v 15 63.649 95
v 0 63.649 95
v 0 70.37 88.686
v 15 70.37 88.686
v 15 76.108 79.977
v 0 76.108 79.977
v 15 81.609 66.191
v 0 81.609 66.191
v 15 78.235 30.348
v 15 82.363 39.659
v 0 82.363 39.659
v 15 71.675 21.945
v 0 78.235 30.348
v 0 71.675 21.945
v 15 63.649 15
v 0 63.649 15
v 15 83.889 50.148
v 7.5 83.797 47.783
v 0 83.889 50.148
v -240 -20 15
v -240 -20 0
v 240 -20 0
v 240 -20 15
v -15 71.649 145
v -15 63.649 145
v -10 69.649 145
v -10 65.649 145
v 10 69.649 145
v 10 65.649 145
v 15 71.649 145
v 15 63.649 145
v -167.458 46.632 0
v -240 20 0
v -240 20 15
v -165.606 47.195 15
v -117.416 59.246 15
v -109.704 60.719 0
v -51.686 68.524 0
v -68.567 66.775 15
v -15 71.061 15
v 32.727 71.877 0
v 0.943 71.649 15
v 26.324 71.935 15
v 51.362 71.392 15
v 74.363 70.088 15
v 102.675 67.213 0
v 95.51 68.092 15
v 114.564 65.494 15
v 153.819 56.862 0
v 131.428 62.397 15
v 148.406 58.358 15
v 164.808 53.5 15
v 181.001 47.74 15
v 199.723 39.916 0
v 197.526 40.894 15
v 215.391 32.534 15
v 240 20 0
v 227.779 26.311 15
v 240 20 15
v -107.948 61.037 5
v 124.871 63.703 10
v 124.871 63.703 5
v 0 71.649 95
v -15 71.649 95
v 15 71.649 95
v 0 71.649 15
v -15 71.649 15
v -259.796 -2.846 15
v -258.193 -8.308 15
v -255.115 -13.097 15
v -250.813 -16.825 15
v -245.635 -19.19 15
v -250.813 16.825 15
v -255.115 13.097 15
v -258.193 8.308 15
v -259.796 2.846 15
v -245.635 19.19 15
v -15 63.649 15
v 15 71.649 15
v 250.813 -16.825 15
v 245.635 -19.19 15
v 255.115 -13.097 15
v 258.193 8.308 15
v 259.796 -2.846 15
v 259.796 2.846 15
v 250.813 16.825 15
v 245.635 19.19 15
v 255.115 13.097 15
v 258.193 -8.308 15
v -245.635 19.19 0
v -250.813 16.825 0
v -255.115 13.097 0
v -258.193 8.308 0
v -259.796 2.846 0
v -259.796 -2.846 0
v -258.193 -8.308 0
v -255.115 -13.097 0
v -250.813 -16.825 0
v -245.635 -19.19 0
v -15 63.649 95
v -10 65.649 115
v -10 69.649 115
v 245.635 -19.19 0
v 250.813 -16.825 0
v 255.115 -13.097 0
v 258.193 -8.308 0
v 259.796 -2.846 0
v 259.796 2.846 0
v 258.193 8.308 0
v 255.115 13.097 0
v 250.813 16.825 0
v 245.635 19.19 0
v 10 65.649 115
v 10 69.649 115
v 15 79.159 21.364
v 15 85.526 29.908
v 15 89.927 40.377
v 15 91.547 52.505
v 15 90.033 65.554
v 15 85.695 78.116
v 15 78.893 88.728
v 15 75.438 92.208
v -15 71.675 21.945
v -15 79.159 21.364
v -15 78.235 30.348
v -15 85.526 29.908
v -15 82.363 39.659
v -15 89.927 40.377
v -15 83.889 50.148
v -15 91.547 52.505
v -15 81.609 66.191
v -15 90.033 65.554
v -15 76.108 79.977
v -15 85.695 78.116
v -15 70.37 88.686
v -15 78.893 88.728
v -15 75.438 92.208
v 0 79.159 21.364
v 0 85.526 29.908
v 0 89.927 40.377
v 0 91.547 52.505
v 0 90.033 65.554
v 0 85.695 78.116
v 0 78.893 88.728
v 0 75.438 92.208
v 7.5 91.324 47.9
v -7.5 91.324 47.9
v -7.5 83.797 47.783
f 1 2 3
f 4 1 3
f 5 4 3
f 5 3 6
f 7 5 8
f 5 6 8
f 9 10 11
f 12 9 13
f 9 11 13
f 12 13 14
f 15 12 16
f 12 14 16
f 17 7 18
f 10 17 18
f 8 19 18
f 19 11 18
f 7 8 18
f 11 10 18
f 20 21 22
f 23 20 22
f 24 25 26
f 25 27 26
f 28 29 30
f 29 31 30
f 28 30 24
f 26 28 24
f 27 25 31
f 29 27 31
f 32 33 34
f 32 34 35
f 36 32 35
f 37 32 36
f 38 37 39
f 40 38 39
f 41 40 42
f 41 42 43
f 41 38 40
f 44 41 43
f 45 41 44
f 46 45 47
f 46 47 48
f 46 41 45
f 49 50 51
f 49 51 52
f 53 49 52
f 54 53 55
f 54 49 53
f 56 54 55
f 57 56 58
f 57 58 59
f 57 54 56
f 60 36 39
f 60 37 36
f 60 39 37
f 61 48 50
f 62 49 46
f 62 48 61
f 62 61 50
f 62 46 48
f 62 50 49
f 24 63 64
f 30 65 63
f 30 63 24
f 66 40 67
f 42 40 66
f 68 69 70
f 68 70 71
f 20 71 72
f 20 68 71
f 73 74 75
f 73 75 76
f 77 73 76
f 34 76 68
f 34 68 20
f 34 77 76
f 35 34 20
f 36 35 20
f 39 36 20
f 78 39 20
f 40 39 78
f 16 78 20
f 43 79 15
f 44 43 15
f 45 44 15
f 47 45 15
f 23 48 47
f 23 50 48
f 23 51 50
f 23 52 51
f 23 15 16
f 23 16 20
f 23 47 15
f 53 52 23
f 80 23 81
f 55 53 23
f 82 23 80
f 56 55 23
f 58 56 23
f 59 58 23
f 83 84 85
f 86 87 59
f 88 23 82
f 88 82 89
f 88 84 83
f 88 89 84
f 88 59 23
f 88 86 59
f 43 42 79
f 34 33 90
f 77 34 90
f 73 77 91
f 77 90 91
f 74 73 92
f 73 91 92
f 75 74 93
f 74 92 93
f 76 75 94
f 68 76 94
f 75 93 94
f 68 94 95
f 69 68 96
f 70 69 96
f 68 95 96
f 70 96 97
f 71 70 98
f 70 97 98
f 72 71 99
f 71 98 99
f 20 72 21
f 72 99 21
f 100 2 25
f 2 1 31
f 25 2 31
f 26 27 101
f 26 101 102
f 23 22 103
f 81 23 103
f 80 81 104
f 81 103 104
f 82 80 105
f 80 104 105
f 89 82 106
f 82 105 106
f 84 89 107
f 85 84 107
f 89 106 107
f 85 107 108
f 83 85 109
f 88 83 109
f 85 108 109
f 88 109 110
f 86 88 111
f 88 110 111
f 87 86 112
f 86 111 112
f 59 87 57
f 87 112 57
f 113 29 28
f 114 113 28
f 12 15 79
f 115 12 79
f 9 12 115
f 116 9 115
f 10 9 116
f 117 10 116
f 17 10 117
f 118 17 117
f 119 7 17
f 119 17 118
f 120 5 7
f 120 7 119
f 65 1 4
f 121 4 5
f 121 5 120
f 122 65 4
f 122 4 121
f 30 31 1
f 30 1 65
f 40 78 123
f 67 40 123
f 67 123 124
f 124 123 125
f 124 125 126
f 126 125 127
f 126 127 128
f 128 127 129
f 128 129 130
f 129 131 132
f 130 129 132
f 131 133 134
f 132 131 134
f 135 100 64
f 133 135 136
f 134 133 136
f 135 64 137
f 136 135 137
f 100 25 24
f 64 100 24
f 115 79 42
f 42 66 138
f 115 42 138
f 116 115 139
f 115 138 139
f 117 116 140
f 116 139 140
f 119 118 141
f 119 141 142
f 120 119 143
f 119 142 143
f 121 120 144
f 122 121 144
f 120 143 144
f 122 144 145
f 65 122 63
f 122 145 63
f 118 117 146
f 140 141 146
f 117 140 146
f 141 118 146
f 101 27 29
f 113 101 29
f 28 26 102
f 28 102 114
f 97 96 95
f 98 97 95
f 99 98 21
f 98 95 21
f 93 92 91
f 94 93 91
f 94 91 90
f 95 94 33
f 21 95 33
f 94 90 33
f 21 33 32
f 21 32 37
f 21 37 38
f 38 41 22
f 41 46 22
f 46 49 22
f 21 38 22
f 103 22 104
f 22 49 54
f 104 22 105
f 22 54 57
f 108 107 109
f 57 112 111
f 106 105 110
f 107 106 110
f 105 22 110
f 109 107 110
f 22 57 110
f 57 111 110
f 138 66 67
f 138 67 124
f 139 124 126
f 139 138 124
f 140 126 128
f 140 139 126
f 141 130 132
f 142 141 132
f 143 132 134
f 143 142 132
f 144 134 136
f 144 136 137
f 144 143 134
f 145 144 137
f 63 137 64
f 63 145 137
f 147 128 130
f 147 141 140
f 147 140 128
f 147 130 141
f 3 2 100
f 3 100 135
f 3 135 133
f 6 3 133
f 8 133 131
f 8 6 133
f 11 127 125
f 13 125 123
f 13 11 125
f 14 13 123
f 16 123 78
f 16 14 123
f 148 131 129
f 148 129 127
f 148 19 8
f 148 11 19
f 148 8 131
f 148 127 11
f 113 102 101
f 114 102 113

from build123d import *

# Parameters (mm, degrees)
F1_DEPTH = 15
F2_W     = 8
F2_H     = 50
F3_DEPTH = 15
F4_W     = 20
F4_H     = 4
F5_DEPTH = 30


with BuildPart() as f1:
    # F0 (on Top) → F1 (new body)
    with BuildSketch(Plane.XY):
        with BuildLine():
            ThreePointArc((-240, 20), (-260, 0), (-240, -20))
            Line((-240, -20), (240, -20))
            ThreePointArc((240, -20), (260, 0), (240, 20))
            add(Edge.make_bspline(
                [(-240, 20), (-201.0380044732, 35.6526101303), (-111.5188369016, 71.6160819761), (127.7105565079, 78.2594773928), (206.7294289612, 37.2618727193), (240, 20)],
                knots=[0, 0, 0, 0, 0.3085194424, 0.7088549571, 1, 1, 1, 1], degree=3))
        make_face()
    extrude(amount=F1_DEPTH)

    # F2 (on Right) → F3 (join, symmetric)
    with BuildSketch(Plane.YZ):
        with BuildLine():
            Line((63.6485348786, 15), (71.6485348786, 15))
            add(Edge.make_bspline(
                [(71.6485348786, 15), (81.1055550979, 21.2851513885), (99.9699154527, 46.3766770593), (84.9787602317, 86.8551220677), (71.6485385144, 95)],
                knots=[0, 0, 0, 0, 0.4642688731, 1, 1, 1, 1], degree=3))
            Line((71.6485385144, 95), (63.6485385144, 95))
            add(Edge.make_bspline(
                [(63.6485385144, 95), (75.6313007905, 86.8630942273), (92.9907729816, 45.3965691415), (73.9991203582, 22.623041553), (63.6485348786, 15)],
                knots=[0, 0, 0, 0, 0.53596906, 1, 1, 1, 1], degree=3))
        make_face()
        with Locations((67.6485385144, 120)):
            Rectangle(F2_W, F2_H)
    extrude(amount=F3_DEPTH, both=True)

    # F4 (on face) → F5 (cut)
    with BuildSketch(Plane.XY.offset(145)):
        with Locations((0, 67.6485385144)):
            Rectangle(F4_W, F4_H)
    extrude(amount=-F5_DEPTH, mode=Mode.SUBTRACT)


solid = f1.part
